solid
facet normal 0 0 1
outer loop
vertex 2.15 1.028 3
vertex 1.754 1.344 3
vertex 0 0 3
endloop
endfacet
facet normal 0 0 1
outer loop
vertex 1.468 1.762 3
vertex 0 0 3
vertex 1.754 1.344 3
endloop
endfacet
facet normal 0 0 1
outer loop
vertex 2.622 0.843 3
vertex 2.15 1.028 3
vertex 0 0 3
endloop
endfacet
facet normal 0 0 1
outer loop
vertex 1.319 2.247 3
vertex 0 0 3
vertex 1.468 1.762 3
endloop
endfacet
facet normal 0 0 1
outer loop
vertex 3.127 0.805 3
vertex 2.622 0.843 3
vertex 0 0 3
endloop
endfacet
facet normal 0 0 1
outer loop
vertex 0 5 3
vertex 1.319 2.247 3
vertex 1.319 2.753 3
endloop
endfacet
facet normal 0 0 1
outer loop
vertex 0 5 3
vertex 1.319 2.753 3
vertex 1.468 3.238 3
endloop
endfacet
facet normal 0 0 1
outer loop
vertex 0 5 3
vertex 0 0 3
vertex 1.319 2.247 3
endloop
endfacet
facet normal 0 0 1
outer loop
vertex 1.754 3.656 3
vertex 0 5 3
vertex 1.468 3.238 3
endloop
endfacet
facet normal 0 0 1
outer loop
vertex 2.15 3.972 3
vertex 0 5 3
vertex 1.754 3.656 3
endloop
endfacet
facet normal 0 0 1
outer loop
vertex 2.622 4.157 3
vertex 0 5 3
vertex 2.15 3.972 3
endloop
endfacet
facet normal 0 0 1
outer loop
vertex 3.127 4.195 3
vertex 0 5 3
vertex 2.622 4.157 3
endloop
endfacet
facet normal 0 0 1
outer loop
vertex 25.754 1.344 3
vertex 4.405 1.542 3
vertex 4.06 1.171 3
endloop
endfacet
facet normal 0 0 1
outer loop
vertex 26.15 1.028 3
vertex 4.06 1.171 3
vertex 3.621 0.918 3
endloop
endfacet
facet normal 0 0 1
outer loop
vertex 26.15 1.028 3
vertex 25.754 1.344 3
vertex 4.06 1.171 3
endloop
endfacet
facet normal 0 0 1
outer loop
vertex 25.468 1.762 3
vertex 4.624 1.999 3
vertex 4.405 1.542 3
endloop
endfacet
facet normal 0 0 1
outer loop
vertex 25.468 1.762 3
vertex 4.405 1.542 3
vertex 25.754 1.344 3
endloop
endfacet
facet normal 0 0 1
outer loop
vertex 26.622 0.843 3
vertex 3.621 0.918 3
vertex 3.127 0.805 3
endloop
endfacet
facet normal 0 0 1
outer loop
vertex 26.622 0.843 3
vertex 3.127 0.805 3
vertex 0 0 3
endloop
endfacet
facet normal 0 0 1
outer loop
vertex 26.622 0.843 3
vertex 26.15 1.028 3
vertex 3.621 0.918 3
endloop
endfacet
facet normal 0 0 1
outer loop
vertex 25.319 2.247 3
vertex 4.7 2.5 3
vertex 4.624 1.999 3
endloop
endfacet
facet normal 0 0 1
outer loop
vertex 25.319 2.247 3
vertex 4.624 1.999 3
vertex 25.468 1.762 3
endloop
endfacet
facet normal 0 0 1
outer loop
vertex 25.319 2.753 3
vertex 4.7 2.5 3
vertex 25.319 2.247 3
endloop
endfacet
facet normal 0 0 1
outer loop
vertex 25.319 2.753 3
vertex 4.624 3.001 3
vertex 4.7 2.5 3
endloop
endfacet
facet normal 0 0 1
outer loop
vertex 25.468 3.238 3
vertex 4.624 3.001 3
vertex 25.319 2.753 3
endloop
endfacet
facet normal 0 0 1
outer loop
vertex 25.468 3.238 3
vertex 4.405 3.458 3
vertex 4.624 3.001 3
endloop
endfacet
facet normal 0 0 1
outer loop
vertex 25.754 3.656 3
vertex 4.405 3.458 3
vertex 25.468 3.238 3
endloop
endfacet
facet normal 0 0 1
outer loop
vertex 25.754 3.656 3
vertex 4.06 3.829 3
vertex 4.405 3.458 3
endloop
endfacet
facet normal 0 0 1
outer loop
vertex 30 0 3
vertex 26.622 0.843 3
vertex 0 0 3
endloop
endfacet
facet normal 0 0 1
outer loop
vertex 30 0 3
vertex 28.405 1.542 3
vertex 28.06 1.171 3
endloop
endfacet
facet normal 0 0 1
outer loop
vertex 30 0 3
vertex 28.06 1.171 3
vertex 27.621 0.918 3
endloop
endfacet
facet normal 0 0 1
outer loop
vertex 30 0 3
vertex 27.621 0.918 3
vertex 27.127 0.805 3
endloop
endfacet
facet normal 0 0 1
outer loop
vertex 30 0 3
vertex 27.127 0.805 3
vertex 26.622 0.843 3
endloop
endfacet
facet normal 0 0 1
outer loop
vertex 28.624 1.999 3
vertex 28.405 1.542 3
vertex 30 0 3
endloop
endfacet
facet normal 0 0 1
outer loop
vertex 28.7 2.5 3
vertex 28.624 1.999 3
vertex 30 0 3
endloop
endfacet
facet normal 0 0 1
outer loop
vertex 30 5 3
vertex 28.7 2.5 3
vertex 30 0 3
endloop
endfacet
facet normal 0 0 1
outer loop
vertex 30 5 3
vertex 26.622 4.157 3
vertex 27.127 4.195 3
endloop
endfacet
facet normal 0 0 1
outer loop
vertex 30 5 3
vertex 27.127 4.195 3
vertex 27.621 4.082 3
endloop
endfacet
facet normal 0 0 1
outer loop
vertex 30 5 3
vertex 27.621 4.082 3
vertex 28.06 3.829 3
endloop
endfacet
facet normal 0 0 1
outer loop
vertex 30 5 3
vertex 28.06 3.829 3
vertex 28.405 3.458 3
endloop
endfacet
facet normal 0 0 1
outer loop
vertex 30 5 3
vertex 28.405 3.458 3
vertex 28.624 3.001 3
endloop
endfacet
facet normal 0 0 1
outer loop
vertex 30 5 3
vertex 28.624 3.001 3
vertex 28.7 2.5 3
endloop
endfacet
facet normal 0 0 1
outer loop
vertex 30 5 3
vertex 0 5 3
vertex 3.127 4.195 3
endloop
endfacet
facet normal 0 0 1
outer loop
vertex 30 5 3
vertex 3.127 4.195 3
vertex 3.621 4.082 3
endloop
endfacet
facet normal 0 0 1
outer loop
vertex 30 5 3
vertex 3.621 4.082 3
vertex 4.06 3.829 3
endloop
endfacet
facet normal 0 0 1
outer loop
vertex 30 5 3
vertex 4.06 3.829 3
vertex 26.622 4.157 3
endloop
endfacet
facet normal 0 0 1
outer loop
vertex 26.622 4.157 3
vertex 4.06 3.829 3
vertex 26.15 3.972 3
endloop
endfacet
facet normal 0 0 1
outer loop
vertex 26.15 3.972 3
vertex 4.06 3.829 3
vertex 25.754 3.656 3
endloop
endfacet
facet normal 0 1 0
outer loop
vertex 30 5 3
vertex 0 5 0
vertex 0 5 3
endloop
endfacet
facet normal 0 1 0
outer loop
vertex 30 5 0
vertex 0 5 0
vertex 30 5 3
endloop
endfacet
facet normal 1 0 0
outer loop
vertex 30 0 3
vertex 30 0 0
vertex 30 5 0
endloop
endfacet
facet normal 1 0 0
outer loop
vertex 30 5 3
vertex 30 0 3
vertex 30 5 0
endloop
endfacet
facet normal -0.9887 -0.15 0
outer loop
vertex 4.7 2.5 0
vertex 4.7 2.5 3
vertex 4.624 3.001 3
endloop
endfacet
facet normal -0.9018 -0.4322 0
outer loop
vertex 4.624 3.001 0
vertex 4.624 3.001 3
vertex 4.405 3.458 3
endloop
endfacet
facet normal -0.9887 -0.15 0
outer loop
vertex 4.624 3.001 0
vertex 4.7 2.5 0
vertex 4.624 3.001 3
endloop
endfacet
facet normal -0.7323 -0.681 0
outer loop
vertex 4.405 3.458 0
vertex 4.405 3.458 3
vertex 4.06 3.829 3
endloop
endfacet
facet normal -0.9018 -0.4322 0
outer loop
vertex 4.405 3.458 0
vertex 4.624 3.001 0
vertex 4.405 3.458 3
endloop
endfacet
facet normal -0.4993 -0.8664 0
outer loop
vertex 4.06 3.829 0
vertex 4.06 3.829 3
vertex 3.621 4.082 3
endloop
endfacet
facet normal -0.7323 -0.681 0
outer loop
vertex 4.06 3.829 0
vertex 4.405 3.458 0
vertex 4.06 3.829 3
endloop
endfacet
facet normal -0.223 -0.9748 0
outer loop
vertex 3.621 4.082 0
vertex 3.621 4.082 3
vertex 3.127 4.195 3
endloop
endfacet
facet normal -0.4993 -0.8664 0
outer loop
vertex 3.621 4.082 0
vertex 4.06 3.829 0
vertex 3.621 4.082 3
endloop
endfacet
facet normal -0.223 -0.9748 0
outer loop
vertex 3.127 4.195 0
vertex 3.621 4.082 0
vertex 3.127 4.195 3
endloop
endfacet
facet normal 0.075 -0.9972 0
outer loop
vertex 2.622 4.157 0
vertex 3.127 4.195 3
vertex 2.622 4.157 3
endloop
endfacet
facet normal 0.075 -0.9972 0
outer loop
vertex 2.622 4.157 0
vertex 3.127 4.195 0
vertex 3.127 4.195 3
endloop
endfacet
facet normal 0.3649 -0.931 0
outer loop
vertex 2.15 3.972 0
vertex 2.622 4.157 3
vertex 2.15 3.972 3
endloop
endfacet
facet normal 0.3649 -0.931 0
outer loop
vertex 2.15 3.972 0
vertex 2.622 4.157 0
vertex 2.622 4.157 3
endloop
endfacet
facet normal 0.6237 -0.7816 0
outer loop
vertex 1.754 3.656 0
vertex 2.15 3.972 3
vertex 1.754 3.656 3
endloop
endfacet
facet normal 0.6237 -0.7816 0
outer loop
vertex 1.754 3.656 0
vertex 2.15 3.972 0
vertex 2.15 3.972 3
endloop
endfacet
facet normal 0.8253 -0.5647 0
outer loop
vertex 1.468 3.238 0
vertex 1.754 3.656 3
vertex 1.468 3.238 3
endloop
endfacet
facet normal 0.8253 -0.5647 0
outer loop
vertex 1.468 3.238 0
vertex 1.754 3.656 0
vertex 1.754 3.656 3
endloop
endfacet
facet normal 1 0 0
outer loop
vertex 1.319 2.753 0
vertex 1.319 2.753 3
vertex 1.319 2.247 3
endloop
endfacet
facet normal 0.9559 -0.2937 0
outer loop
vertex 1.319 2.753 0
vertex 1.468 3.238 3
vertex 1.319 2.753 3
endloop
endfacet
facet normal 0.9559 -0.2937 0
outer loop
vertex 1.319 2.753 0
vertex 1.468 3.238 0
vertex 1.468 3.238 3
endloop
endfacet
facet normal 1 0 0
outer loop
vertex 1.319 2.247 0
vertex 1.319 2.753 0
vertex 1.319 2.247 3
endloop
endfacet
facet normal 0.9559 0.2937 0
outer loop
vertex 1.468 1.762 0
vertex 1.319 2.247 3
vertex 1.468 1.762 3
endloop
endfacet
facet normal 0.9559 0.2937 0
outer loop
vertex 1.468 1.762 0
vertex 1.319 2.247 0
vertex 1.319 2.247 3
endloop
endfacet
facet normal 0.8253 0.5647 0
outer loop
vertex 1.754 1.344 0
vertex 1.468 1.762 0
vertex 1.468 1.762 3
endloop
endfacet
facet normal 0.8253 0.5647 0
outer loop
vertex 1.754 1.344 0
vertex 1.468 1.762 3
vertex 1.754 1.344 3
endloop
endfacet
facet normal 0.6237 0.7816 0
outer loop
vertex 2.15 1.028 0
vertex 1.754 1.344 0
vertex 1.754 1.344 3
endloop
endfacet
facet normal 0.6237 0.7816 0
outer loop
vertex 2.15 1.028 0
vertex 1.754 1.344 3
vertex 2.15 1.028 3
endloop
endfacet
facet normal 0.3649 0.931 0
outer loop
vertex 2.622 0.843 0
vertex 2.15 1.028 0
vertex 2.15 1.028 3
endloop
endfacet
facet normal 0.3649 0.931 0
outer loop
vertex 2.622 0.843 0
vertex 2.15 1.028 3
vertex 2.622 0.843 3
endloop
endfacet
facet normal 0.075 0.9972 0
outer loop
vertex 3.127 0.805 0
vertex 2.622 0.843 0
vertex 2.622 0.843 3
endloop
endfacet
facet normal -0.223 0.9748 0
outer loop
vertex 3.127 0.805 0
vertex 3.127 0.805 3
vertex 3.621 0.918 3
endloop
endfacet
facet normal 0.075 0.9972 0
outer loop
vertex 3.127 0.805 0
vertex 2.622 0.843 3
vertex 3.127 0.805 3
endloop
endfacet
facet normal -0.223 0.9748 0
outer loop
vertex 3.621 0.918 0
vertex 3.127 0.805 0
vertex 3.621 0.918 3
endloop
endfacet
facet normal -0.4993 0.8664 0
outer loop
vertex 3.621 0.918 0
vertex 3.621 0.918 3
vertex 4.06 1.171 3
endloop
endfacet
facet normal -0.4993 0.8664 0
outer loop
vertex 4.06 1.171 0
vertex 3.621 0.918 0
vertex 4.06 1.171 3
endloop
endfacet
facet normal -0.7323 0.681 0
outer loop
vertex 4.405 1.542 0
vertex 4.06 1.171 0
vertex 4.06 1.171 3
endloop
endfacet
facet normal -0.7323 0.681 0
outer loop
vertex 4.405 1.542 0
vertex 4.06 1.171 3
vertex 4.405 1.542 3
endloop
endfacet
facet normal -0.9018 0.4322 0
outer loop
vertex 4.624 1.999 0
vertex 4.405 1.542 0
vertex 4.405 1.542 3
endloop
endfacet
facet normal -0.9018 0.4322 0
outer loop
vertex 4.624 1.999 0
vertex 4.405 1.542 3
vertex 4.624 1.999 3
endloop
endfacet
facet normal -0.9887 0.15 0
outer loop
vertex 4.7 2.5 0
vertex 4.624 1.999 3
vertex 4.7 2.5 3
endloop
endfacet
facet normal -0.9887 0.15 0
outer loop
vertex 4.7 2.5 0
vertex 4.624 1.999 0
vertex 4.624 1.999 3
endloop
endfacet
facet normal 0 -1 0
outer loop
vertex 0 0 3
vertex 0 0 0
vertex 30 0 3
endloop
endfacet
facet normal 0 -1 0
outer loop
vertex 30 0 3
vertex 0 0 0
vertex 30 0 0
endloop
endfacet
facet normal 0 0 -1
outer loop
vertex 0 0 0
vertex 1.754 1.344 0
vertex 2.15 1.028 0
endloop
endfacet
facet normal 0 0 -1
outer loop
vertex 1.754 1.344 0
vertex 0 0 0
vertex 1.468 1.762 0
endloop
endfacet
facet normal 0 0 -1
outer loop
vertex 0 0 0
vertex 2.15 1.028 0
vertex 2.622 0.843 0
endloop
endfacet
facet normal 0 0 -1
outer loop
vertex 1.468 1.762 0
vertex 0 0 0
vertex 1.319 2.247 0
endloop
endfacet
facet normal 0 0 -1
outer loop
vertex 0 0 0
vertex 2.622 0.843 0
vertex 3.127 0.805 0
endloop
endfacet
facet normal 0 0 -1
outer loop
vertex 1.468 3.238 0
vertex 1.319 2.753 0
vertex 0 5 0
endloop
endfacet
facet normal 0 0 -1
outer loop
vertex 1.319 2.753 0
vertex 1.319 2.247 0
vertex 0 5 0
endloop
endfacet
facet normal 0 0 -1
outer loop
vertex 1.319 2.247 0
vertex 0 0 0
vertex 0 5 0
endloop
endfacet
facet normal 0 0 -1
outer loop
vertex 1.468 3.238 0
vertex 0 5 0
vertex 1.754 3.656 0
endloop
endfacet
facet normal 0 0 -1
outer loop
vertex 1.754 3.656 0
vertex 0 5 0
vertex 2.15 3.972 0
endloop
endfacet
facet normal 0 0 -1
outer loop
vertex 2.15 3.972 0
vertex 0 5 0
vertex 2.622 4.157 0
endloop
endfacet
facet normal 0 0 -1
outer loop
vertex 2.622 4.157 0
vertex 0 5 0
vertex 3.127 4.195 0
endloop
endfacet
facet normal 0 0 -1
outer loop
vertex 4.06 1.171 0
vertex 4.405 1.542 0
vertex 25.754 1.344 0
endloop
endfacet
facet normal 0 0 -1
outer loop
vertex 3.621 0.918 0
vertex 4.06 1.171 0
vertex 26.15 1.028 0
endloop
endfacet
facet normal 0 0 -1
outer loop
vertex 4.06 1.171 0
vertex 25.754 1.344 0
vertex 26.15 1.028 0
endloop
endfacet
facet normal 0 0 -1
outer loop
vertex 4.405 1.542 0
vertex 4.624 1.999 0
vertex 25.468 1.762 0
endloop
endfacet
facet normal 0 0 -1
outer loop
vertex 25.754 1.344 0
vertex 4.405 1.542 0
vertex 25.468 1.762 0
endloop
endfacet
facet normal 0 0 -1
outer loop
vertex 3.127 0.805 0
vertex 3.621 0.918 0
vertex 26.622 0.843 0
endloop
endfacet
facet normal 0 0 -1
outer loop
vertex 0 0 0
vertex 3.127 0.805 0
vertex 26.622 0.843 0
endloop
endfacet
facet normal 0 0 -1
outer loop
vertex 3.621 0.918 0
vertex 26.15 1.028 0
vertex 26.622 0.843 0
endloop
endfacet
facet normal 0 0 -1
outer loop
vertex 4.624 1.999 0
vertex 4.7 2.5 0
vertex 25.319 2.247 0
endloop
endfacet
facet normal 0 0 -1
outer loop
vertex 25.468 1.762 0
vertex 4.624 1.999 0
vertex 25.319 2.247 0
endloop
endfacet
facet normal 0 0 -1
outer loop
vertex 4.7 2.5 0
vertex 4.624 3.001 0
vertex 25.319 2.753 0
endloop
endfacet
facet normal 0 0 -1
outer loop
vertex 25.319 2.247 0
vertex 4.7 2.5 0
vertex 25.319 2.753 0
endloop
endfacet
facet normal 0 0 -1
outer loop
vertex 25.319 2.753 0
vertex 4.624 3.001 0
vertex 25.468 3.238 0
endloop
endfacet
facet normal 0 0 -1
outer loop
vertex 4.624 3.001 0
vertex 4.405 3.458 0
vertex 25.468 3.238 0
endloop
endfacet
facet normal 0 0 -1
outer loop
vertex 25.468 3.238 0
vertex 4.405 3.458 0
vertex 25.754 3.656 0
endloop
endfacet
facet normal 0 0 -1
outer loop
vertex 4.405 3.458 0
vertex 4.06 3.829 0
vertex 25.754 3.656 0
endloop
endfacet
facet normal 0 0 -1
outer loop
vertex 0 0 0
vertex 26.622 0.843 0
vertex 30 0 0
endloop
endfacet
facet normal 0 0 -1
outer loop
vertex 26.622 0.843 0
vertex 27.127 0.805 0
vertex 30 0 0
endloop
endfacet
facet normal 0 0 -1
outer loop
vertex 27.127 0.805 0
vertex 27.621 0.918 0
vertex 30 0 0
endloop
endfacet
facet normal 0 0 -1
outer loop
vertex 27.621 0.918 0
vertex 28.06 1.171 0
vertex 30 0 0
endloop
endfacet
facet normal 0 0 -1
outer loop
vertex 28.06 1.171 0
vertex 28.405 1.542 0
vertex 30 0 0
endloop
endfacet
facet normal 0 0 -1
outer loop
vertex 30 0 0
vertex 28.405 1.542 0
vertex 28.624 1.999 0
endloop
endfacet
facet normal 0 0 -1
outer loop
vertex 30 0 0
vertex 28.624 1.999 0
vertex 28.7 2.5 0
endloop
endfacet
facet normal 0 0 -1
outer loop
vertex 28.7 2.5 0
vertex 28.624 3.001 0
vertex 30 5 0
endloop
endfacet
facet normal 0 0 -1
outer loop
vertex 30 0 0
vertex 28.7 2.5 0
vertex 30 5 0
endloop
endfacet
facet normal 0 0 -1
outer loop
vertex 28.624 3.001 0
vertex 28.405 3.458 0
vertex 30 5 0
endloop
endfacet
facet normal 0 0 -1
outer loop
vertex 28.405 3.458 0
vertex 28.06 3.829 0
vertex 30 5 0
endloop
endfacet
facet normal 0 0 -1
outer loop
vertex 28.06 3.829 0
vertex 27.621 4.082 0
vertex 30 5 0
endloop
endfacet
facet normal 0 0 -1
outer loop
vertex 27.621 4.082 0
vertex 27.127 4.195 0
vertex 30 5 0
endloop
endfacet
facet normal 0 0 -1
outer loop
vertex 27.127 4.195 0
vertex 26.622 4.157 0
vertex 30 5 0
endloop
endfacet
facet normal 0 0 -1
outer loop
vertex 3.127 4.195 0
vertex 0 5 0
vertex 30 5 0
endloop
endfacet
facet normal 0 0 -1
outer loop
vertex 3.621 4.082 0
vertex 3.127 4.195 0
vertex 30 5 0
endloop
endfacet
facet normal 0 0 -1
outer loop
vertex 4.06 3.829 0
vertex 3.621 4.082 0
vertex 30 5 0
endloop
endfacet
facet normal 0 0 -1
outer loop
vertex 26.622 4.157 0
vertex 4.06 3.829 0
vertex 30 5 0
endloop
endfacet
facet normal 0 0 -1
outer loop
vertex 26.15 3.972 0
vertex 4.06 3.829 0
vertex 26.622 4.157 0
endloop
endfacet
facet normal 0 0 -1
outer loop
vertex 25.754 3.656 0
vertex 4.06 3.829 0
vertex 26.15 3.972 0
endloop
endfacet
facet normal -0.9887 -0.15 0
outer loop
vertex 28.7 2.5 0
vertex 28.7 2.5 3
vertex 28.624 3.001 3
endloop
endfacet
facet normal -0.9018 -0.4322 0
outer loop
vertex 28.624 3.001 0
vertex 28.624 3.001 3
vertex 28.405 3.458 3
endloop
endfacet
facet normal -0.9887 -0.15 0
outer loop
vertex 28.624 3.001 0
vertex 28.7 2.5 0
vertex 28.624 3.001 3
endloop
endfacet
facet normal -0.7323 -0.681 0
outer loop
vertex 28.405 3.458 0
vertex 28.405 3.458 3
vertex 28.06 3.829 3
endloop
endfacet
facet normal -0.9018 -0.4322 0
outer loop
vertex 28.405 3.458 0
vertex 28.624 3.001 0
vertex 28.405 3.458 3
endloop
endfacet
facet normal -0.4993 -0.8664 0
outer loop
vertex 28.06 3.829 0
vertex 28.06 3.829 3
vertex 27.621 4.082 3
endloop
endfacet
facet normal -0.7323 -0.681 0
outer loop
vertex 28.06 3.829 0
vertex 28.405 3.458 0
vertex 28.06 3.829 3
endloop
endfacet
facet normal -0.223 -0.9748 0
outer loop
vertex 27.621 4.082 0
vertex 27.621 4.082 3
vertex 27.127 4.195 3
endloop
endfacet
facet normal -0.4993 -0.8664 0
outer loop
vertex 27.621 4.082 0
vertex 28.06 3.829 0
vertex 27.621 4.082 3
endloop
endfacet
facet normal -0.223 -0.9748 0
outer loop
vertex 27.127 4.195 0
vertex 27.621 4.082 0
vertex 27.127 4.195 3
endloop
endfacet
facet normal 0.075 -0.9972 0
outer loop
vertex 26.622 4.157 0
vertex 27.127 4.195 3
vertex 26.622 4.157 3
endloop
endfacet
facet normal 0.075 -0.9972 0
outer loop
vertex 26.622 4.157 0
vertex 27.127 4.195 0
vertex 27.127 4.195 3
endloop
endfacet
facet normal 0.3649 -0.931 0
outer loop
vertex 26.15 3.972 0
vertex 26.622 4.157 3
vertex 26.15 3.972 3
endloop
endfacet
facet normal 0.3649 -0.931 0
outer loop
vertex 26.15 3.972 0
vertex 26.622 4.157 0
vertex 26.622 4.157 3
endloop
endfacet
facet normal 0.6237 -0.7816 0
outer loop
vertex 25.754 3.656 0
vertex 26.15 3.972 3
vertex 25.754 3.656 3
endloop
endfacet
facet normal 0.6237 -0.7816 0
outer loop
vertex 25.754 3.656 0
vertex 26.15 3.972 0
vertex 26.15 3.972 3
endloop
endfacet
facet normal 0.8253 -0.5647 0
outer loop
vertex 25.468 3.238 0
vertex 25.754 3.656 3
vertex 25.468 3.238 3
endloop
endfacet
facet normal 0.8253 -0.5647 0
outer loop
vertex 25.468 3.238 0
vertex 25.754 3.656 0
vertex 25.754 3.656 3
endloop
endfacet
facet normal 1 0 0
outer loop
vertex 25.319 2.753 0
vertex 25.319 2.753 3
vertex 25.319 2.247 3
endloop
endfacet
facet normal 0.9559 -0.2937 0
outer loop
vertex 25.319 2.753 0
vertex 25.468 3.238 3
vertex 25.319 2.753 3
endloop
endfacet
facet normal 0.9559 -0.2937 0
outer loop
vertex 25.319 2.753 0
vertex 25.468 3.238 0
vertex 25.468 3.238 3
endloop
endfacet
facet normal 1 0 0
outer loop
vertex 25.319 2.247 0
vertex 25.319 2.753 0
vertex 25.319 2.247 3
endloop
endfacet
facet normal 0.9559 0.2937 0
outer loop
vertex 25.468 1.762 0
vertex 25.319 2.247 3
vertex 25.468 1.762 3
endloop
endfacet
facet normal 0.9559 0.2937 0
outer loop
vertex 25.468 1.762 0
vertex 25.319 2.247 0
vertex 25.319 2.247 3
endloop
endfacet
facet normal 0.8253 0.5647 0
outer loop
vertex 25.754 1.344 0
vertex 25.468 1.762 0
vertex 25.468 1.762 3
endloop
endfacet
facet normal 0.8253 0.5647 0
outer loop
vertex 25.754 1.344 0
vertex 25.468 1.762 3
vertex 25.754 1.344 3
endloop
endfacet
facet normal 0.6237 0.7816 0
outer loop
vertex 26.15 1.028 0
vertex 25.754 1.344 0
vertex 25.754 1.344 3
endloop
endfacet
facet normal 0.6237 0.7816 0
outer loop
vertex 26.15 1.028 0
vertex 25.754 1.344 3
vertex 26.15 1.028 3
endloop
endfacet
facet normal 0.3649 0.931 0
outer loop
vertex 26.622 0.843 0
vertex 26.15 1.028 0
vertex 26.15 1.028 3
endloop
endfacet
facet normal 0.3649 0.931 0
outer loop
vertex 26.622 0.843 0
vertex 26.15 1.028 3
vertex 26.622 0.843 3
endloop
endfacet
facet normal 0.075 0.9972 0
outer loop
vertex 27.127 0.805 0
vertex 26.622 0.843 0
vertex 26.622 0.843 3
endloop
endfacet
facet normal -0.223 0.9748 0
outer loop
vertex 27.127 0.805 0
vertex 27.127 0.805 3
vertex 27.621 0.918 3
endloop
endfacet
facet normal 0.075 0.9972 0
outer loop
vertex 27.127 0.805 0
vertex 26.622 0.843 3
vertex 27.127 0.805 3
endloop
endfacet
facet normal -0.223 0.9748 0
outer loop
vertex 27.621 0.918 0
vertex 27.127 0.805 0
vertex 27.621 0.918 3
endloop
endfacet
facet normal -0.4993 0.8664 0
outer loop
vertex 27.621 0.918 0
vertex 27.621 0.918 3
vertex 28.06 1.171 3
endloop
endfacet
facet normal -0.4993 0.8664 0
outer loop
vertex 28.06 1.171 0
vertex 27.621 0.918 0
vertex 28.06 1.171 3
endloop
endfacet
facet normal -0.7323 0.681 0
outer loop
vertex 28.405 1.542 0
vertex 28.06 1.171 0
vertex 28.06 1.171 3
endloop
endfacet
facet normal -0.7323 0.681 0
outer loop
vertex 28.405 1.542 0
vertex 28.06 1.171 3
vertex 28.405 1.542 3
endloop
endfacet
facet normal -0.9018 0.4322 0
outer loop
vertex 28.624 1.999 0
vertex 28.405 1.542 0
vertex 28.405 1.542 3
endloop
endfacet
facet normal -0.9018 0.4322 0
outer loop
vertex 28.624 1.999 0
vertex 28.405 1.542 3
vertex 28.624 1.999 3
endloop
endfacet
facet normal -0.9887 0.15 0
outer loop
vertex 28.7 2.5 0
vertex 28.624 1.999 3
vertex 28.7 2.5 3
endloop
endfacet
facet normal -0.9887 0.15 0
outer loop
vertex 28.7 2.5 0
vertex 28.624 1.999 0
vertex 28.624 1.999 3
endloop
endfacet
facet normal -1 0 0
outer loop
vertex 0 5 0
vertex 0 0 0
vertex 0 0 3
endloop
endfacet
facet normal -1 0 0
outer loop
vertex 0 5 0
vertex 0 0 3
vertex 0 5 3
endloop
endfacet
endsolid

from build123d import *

# Parameters (mm, degrees)
CYLINDER004_R     = 1.7
CYLINDER004_DEPTH = 10
CYLINDER003_R     = 1.7
CYLINDER003_DEPTH = 10
BOX008_W          = 30
BOX008_H          = 5
BOX008_DEPTH      = 3


with BuildPart() as cylinder004:
    # Cylinder004 → Cylinder004 (new body)
    with BuildSketch(Plane(origin=(27, 2.5, 0), x_dir=(1, 0, 0), z_dir=(0, 0, 1))):
        Circle(CYLINDER004_R)
    extrude(amount=CYLINDER004_DEPTH)


with BuildPart() as cylinder003:
    # Cylinder003 → Cylinder003 (new body)
    with BuildSketch(Plane(origin=(3, 2.5, 0), x_dir=(1, 0, 0), z_dir=(0, 0, 1))):
        Circle(CYLINDER003_R)
    extrude(amount=CYLINDER003_DEPTH)


with BuildPart() as slidearm:
    # Box008 → Box008 (new body)
    with BuildSketch(Plane.XY):
        with Locations((15, 2.5)):
            Rectangle(BOX008_W, BOX008_H)
    extrude(amount=BOX008_DEPTH)

    # Cut006: cut Cylinder003
    add(cylinder003.part, mode=Mode.SUBTRACT)

    # Cut007: cut Cylinder004
    add(cylinder004.part, mode=Mode.SUBTRACT)


solid = slidearm.part
